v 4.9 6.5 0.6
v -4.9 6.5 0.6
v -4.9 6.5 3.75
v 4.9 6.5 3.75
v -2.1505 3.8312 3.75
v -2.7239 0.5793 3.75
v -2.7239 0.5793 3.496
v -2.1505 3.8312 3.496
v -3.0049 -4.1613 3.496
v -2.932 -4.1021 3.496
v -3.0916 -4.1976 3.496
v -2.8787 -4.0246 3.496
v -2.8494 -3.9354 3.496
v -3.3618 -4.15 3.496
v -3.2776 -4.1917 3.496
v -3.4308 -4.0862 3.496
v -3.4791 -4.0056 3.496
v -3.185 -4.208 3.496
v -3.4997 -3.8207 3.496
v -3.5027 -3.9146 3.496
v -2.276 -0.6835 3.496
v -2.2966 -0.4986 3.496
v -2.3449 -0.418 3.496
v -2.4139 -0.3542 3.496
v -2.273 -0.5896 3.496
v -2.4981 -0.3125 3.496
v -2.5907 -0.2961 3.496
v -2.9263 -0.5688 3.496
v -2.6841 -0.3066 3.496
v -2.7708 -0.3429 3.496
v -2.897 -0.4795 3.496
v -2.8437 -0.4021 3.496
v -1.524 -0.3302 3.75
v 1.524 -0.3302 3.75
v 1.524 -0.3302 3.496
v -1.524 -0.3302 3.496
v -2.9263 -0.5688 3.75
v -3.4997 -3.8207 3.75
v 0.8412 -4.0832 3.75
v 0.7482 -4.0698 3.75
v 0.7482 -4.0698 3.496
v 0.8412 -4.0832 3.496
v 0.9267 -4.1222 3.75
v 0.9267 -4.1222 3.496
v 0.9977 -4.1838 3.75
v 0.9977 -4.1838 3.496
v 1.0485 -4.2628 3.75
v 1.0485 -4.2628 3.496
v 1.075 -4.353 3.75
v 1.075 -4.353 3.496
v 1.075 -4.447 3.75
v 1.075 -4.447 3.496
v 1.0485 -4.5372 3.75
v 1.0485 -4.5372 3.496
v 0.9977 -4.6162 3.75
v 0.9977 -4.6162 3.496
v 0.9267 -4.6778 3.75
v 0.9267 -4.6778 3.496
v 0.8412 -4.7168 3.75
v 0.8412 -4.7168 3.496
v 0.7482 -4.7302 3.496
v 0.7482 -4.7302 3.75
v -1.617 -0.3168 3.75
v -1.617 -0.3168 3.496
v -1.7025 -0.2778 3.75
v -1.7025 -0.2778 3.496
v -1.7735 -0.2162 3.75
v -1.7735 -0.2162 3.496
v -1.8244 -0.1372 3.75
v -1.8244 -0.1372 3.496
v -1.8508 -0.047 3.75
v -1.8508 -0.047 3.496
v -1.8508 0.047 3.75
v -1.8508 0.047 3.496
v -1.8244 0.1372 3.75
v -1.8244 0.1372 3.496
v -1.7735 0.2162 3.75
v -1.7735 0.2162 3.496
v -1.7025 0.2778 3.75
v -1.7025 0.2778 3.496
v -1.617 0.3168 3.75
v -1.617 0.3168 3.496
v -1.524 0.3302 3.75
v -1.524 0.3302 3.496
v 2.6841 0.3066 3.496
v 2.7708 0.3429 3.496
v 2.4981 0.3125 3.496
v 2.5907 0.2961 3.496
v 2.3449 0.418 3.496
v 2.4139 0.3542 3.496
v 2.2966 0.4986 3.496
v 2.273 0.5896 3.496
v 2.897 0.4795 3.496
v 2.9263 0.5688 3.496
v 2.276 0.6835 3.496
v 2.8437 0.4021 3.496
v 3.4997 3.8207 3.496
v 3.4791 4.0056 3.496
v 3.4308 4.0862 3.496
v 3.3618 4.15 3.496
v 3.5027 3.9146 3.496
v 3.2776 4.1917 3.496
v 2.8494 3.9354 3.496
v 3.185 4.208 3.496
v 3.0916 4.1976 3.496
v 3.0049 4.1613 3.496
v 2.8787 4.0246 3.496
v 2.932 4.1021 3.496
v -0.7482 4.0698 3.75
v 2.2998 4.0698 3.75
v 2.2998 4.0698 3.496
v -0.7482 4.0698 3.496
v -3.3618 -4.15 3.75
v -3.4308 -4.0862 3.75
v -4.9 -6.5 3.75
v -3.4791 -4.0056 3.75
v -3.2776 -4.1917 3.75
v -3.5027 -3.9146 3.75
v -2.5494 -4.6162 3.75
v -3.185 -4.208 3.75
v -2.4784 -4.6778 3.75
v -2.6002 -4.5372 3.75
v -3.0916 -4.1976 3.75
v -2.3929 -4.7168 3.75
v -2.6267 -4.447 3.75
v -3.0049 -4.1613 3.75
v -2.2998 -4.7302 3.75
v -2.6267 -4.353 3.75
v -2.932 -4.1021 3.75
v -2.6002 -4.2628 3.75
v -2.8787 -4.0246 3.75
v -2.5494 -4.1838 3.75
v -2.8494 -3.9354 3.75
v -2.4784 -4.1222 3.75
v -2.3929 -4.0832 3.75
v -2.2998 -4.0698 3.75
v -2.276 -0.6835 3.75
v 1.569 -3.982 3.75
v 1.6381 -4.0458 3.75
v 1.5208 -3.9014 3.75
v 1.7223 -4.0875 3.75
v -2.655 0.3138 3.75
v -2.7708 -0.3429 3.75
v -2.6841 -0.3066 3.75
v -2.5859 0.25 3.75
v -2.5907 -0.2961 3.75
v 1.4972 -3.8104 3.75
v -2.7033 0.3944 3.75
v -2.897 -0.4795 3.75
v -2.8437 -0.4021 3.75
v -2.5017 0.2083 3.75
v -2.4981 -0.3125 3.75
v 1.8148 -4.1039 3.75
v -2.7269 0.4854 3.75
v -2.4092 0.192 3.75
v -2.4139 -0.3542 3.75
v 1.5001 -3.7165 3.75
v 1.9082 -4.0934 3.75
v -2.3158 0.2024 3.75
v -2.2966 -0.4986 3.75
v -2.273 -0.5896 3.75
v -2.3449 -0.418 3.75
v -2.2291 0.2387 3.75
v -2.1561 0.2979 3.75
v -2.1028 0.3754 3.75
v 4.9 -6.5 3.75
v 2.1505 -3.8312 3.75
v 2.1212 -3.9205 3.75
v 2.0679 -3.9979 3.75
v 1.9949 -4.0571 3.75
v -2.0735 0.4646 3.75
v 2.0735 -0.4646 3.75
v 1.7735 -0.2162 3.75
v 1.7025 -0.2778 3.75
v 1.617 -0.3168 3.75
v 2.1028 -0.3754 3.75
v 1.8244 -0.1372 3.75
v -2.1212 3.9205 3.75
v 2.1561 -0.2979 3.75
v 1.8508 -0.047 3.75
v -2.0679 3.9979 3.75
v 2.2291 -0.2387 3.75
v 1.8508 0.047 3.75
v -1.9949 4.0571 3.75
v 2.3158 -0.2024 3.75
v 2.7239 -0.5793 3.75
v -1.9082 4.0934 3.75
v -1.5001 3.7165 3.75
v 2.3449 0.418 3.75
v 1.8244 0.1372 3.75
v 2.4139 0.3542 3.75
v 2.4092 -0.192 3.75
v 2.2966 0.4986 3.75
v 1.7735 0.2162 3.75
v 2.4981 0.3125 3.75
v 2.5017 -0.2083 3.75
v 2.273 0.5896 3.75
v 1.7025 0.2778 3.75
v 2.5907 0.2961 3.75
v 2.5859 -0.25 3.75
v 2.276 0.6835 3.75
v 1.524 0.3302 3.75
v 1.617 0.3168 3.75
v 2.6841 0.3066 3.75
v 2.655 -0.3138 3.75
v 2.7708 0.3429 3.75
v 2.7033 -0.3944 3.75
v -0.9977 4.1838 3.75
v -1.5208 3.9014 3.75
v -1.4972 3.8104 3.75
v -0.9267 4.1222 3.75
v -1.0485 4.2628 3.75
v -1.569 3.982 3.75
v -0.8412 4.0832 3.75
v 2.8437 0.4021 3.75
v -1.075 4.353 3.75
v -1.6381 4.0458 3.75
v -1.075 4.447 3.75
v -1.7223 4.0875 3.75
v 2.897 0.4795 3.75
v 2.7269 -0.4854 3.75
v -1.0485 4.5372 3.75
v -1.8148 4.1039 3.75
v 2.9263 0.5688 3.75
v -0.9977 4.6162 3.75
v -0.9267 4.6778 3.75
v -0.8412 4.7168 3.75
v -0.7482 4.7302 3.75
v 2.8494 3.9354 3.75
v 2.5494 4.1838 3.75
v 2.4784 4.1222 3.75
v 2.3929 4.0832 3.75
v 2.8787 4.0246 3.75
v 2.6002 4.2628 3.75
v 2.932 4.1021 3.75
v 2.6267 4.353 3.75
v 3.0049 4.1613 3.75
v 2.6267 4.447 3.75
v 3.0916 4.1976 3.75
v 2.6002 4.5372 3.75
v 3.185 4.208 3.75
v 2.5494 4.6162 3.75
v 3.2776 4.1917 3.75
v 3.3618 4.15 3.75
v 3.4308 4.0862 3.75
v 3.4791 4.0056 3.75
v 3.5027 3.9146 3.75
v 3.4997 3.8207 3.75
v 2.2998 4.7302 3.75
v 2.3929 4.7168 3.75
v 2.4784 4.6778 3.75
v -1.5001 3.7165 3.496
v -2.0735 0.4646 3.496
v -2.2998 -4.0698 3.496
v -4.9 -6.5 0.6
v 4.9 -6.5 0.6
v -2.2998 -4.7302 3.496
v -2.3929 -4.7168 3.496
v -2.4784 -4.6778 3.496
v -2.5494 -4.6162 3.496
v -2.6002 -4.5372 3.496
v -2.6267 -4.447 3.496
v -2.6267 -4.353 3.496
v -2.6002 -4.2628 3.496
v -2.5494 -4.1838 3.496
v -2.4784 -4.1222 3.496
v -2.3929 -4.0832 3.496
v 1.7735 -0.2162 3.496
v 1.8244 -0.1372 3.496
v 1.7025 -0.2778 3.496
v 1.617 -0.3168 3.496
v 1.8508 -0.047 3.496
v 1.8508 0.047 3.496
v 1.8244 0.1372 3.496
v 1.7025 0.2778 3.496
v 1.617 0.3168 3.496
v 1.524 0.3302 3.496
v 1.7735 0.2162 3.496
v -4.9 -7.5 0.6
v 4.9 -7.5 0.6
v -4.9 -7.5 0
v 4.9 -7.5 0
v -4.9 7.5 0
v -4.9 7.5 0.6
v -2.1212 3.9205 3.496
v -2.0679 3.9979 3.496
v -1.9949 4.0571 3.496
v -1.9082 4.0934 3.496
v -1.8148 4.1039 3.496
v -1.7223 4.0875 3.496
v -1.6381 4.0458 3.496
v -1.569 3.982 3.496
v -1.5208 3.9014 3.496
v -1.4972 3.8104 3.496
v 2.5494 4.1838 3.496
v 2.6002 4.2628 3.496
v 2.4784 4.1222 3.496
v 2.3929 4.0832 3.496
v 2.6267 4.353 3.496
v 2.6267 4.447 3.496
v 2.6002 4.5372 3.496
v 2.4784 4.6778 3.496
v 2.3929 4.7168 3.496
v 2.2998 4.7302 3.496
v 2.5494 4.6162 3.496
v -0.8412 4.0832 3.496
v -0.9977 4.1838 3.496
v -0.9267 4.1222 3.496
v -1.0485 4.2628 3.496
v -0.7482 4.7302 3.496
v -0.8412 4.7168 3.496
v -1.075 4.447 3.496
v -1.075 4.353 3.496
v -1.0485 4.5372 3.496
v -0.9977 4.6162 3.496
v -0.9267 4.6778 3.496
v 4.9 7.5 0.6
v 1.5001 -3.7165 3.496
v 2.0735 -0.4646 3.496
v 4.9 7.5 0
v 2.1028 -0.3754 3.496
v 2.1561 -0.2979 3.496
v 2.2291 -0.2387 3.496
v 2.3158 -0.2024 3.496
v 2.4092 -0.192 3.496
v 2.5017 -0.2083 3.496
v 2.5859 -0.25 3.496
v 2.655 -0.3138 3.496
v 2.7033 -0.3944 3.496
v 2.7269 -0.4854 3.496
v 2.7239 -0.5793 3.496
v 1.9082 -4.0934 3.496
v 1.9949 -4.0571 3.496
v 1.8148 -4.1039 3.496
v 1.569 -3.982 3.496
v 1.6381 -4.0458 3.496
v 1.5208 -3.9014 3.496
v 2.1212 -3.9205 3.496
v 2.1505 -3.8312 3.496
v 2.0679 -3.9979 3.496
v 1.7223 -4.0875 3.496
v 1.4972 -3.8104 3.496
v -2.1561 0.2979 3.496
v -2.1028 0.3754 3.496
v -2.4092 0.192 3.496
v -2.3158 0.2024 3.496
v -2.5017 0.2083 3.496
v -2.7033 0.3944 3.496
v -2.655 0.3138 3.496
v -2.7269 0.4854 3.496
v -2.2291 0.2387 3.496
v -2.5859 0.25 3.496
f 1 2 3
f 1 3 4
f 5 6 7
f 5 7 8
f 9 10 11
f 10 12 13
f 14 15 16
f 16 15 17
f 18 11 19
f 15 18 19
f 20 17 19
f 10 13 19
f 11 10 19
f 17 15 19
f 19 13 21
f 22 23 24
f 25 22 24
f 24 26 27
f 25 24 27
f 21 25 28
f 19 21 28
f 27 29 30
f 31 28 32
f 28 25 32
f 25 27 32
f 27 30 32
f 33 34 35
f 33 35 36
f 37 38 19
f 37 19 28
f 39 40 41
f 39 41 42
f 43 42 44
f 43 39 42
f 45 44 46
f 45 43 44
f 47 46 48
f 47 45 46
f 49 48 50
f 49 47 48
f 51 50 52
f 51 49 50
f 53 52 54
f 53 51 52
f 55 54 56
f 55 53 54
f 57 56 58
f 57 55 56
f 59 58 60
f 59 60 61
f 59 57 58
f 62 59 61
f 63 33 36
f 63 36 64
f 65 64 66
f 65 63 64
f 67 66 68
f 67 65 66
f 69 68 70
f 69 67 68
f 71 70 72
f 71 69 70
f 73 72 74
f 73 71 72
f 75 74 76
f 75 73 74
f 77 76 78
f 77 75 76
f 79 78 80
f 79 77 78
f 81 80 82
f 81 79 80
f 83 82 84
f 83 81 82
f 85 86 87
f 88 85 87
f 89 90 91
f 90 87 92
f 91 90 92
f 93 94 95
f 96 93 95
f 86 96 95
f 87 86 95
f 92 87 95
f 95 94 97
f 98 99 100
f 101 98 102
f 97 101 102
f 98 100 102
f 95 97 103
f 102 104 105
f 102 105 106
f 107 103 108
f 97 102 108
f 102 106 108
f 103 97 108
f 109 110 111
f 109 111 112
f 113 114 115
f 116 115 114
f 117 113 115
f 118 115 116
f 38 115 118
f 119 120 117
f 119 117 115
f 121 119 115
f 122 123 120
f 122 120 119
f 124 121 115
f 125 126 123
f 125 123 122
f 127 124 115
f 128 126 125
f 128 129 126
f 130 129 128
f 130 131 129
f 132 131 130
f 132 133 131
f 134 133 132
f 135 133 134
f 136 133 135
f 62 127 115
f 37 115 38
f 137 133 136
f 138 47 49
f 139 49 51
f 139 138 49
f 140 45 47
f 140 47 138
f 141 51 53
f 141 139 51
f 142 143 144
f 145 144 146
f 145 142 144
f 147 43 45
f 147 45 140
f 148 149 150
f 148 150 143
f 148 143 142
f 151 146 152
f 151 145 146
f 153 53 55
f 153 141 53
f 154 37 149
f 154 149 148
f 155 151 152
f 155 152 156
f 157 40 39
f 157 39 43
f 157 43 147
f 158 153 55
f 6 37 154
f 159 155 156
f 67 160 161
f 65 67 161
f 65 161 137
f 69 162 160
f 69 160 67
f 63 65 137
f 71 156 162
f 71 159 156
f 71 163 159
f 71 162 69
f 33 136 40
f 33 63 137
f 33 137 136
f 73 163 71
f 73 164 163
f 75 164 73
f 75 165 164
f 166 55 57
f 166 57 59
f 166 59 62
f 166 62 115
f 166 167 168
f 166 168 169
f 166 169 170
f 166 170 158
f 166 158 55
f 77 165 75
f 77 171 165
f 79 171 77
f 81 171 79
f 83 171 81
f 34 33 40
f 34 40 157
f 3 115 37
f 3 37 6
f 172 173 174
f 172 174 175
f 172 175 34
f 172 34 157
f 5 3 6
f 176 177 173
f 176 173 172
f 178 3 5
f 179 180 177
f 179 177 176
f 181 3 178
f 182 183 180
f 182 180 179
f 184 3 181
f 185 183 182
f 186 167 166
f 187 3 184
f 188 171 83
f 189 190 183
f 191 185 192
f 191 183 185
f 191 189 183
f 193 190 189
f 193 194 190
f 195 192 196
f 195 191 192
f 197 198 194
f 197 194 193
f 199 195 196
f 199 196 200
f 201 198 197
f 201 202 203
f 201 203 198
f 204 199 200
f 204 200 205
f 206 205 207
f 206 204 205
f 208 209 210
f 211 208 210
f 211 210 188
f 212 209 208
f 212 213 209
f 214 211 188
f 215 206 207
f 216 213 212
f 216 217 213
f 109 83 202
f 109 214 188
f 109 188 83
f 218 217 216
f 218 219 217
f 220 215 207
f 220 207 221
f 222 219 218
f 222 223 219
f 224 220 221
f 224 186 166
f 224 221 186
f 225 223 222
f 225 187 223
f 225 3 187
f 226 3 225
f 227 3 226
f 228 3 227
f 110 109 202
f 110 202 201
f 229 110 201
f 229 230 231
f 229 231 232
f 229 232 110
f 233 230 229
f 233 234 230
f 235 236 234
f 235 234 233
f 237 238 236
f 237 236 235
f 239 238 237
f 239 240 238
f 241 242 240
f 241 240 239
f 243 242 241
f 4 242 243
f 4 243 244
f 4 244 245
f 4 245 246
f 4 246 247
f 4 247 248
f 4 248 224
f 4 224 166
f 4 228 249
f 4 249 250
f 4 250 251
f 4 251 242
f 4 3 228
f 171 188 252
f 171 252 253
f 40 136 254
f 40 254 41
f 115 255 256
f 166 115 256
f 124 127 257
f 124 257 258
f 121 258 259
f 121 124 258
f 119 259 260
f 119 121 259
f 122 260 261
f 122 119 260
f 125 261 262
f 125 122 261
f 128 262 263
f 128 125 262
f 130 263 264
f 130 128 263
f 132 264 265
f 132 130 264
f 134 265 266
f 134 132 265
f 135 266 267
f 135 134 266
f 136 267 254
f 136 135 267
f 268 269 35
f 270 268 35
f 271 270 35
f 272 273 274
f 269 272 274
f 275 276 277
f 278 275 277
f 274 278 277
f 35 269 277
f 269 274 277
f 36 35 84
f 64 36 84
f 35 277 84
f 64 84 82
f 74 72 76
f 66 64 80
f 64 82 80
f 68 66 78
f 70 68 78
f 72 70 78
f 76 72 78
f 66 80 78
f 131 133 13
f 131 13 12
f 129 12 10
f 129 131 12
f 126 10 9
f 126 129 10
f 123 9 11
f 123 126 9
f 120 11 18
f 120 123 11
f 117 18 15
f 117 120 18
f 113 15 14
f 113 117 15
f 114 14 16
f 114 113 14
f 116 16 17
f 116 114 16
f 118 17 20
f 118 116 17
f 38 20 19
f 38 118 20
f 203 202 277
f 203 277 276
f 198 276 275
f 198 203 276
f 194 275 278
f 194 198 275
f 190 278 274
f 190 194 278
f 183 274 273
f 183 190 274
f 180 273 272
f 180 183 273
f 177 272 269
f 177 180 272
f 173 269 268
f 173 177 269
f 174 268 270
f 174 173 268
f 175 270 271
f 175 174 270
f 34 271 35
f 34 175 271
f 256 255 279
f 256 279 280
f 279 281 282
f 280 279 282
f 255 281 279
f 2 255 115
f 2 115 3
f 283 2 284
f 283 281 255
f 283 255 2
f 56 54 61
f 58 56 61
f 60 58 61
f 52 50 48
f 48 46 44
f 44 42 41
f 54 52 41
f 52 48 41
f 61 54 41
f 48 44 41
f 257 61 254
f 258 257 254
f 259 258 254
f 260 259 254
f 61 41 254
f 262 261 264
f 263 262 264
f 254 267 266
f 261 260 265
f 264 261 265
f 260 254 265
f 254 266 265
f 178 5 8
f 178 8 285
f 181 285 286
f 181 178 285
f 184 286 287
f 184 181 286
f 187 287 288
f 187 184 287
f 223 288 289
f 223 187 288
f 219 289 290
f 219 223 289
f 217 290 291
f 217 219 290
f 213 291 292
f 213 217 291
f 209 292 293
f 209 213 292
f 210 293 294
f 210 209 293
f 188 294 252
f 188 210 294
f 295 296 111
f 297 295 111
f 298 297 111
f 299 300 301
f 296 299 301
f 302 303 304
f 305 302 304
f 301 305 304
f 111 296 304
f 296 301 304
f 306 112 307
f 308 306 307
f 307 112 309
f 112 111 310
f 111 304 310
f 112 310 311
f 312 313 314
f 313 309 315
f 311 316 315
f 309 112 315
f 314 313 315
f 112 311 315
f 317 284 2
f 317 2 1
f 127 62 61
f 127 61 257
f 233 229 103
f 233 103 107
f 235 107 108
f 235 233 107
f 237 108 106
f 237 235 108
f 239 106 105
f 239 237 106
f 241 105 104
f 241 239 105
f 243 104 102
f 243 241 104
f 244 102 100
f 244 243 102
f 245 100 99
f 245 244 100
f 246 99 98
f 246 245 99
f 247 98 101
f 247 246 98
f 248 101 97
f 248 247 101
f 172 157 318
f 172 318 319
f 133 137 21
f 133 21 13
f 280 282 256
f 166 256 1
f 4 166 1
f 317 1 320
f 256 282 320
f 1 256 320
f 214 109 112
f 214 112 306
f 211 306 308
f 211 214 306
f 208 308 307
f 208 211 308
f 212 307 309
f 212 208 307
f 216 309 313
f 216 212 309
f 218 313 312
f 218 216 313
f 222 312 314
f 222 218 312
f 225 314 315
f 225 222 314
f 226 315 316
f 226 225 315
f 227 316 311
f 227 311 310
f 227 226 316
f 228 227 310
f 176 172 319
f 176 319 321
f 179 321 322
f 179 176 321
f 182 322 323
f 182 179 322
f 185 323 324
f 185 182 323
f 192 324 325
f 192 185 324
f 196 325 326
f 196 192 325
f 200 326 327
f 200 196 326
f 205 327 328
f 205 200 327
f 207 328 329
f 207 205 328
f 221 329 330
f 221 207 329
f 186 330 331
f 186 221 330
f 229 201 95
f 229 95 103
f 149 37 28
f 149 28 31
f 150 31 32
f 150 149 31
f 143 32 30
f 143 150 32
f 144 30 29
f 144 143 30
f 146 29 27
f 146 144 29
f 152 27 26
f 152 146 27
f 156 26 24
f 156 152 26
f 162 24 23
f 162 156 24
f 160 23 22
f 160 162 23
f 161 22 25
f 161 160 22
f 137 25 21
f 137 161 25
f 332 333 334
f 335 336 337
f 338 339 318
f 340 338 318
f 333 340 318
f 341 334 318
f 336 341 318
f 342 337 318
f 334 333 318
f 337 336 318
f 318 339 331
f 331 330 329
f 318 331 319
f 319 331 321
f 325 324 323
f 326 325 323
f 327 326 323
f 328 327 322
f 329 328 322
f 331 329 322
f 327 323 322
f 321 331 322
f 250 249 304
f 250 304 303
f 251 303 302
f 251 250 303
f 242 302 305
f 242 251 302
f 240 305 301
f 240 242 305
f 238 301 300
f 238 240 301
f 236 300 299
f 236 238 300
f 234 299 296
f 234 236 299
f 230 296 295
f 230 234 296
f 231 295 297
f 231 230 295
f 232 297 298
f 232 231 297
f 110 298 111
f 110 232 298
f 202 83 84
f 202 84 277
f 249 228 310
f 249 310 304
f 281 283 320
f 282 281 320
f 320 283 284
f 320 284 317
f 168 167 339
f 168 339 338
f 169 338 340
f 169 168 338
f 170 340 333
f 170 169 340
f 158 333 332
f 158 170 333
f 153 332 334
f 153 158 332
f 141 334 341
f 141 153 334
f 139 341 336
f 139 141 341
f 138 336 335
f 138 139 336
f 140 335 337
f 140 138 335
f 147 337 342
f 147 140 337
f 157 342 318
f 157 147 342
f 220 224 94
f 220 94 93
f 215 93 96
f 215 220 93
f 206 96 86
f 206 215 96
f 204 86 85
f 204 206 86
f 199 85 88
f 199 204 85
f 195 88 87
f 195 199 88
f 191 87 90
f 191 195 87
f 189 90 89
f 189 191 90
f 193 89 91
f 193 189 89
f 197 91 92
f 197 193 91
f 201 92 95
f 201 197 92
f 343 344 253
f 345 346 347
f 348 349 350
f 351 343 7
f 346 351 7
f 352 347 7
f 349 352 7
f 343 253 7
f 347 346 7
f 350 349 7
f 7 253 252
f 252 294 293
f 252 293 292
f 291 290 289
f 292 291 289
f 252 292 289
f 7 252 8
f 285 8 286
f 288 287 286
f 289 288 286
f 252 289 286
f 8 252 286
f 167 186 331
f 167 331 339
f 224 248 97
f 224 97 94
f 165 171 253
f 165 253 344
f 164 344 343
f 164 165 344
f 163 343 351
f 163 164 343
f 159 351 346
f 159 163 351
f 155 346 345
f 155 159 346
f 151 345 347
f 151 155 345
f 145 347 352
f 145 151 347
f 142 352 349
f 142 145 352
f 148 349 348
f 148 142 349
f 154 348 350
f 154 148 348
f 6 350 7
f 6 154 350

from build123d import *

# Parameters (mm, degrees)
SKETCH2_W           = 9.8
SKETCH2_H           = 15
BOSS_EXTRUDE1_DEPTH = 0.6
SKETCH3_W           = 9.8
SKETCH3_H           = 13
BOSS_EXTRUDE2_DEPTH = 3.15
CUT_EXTRUDE1_DEPTH  = 0.254


with BuildPart() as part:
    # Sketch2 → Boss-Extrude1 (new body)
    with BuildSketch(Plane.XY):
        Rectangle(SKETCH2_W, SKETCH2_H)
    extrude(amount=BOSS_EXTRUDE1_DEPTH)

    # Sketch3 → Boss-Extrude2 (add)
    with BuildSketch(Plane.XY.offset(0.6)):
        Rectangle(SKETCH3_W, SKETCH3_H)
    extrude(amount=BOSS_EXTRUDE2_DEPTH)

    # Sketch8 → Cut-Extrude1 (cut)
    with BuildSketch(Plane.XY.offset(3.75)):
        with BuildLine():
            Line((-2.723886994, 0.579326575), (-2.150500712, 3.831161775))
            ThreePointArc((-2.150500712, 3.831161775), (-1.767978563, 4.099006667), (-1.500133672, 3.716484519))
            Line((-1.500133672, 3.716484519), (-2.073519954, 0.464649318))
            ThreePointArc((-2.073519954, 0.464649318), (-2.456042103, 0.196804426), (-2.723886994, 0.579326575))
        make_face()
        with BuildLine():
            Line((3.499725709, 3.820673425), (2.926339427, 0.568838225))
            ThreePointArc((2.926339427, 0.568838225), (2.543817278, 0.300993333), (2.275972387, 0.683515481))
            Line((2.275972387, 0.683515481), (2.849358669, 3.935350682))
            ThreePointArc((2.849358669, 3.935350682), (3.231880818, 4.203195574), (3.499725709, 3.820673425))
        make_face()
        with BuildLine():
            Line((-3.499725709, -3.820673425), (-2.926339427, -0.568838225))
            ThreePointArc((-2.926339427, -0.568838225), (-2.543817278, -0.300993333), (-2.275972387, -0.683515481))
            Line((-2.275972387, -0.683515481), (-2.849358669, -3.935350682))
            ThreePointArc((-2.849358669, -3.935350682), (-3.231880818, -4.203195574), (-3.499725709, -3.820673425))
        make_face()
        with BuildLine():
            Line((1.500133672, -3.716484519), (2.073519954, -0.464649318))
            ThreePointArc((2.073519954, -0.464649318), (2.456042103, -0.196804426), (2.723886994, -0.579326575))
            Line((2.723886994, -0.579326575), (2.150500712, -3.831161775))
            ThreePointArc((2.150500712, -3.831161775), (1.767978563, -4.099006667), (1.500133672, -3.716484519))
        make_face()
        with BuildLine():
            Line((-2.299838715, -4.0698), (0.748161285, -4.0698))
            ThreePointArc((0.748161285, -4.0698), (1.078361285, -4.4), (0.748161285, -4.7302))
            Line((0.748161285, -4.7302), (-2.299838715, -4.7302))
            ThreePointArc((-2.299838715, -4.7302), (-2.630038715, -4.4), (-2.299838715, -4.0698))
        make_face()
        with BuildLine():
            Line((-1.524, 0.3302), (1.524, 0.3302))
            ThreePointArc((1.524, 0.3302), (1.8542, 0), (1.524, -0.3302))
            Line((1.524, -0.3302), (-1.524, -0.3302))
            ThreePointArc((-1.524, -0.3302), (-1.8542, 0), (-1.524, 0.3302))
        make_face()
        with BuildLine():
            Line((-0.748161285, 4.7302), (2.299838715, 4.7302))
            ThreePointArc((2.299838715, 4.7302), (2.630038715, 4.4), (2.299838715, 4.0698))
            Line((2.299838715, 4.0698), (-0.748161285, 4.0698))
            ThreePointArc((-0.748161285, 4.0698), (-1.078361285, 4.4), (-0.748161285, 4.7302))
        make_face()
    extrude(amount=-CUT_EXTRUDE1_DEPTH, mode=Mode.SUBTRACT)


solid = part.part
